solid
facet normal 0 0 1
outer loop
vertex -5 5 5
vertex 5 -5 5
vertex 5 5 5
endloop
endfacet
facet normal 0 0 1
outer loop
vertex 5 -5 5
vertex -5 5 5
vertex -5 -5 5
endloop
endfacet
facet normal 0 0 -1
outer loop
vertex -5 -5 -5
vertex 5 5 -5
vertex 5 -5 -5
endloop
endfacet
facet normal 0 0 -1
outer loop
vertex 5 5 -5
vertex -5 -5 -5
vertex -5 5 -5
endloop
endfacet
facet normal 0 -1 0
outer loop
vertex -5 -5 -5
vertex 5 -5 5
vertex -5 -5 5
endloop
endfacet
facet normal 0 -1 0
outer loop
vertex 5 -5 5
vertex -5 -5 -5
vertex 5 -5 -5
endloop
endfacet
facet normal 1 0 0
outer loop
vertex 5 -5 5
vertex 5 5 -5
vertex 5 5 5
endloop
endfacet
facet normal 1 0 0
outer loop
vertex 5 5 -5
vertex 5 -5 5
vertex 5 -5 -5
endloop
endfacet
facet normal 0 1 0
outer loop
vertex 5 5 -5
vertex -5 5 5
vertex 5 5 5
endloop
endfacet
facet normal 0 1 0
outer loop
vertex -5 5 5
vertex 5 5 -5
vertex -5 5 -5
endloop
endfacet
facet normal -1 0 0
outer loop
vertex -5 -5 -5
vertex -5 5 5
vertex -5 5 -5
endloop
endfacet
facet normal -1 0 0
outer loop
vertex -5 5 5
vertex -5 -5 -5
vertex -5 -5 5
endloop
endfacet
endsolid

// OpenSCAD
// Parameters
size = 10;
$fn = 32;

// Model
cube([size, size, size], center=true);
